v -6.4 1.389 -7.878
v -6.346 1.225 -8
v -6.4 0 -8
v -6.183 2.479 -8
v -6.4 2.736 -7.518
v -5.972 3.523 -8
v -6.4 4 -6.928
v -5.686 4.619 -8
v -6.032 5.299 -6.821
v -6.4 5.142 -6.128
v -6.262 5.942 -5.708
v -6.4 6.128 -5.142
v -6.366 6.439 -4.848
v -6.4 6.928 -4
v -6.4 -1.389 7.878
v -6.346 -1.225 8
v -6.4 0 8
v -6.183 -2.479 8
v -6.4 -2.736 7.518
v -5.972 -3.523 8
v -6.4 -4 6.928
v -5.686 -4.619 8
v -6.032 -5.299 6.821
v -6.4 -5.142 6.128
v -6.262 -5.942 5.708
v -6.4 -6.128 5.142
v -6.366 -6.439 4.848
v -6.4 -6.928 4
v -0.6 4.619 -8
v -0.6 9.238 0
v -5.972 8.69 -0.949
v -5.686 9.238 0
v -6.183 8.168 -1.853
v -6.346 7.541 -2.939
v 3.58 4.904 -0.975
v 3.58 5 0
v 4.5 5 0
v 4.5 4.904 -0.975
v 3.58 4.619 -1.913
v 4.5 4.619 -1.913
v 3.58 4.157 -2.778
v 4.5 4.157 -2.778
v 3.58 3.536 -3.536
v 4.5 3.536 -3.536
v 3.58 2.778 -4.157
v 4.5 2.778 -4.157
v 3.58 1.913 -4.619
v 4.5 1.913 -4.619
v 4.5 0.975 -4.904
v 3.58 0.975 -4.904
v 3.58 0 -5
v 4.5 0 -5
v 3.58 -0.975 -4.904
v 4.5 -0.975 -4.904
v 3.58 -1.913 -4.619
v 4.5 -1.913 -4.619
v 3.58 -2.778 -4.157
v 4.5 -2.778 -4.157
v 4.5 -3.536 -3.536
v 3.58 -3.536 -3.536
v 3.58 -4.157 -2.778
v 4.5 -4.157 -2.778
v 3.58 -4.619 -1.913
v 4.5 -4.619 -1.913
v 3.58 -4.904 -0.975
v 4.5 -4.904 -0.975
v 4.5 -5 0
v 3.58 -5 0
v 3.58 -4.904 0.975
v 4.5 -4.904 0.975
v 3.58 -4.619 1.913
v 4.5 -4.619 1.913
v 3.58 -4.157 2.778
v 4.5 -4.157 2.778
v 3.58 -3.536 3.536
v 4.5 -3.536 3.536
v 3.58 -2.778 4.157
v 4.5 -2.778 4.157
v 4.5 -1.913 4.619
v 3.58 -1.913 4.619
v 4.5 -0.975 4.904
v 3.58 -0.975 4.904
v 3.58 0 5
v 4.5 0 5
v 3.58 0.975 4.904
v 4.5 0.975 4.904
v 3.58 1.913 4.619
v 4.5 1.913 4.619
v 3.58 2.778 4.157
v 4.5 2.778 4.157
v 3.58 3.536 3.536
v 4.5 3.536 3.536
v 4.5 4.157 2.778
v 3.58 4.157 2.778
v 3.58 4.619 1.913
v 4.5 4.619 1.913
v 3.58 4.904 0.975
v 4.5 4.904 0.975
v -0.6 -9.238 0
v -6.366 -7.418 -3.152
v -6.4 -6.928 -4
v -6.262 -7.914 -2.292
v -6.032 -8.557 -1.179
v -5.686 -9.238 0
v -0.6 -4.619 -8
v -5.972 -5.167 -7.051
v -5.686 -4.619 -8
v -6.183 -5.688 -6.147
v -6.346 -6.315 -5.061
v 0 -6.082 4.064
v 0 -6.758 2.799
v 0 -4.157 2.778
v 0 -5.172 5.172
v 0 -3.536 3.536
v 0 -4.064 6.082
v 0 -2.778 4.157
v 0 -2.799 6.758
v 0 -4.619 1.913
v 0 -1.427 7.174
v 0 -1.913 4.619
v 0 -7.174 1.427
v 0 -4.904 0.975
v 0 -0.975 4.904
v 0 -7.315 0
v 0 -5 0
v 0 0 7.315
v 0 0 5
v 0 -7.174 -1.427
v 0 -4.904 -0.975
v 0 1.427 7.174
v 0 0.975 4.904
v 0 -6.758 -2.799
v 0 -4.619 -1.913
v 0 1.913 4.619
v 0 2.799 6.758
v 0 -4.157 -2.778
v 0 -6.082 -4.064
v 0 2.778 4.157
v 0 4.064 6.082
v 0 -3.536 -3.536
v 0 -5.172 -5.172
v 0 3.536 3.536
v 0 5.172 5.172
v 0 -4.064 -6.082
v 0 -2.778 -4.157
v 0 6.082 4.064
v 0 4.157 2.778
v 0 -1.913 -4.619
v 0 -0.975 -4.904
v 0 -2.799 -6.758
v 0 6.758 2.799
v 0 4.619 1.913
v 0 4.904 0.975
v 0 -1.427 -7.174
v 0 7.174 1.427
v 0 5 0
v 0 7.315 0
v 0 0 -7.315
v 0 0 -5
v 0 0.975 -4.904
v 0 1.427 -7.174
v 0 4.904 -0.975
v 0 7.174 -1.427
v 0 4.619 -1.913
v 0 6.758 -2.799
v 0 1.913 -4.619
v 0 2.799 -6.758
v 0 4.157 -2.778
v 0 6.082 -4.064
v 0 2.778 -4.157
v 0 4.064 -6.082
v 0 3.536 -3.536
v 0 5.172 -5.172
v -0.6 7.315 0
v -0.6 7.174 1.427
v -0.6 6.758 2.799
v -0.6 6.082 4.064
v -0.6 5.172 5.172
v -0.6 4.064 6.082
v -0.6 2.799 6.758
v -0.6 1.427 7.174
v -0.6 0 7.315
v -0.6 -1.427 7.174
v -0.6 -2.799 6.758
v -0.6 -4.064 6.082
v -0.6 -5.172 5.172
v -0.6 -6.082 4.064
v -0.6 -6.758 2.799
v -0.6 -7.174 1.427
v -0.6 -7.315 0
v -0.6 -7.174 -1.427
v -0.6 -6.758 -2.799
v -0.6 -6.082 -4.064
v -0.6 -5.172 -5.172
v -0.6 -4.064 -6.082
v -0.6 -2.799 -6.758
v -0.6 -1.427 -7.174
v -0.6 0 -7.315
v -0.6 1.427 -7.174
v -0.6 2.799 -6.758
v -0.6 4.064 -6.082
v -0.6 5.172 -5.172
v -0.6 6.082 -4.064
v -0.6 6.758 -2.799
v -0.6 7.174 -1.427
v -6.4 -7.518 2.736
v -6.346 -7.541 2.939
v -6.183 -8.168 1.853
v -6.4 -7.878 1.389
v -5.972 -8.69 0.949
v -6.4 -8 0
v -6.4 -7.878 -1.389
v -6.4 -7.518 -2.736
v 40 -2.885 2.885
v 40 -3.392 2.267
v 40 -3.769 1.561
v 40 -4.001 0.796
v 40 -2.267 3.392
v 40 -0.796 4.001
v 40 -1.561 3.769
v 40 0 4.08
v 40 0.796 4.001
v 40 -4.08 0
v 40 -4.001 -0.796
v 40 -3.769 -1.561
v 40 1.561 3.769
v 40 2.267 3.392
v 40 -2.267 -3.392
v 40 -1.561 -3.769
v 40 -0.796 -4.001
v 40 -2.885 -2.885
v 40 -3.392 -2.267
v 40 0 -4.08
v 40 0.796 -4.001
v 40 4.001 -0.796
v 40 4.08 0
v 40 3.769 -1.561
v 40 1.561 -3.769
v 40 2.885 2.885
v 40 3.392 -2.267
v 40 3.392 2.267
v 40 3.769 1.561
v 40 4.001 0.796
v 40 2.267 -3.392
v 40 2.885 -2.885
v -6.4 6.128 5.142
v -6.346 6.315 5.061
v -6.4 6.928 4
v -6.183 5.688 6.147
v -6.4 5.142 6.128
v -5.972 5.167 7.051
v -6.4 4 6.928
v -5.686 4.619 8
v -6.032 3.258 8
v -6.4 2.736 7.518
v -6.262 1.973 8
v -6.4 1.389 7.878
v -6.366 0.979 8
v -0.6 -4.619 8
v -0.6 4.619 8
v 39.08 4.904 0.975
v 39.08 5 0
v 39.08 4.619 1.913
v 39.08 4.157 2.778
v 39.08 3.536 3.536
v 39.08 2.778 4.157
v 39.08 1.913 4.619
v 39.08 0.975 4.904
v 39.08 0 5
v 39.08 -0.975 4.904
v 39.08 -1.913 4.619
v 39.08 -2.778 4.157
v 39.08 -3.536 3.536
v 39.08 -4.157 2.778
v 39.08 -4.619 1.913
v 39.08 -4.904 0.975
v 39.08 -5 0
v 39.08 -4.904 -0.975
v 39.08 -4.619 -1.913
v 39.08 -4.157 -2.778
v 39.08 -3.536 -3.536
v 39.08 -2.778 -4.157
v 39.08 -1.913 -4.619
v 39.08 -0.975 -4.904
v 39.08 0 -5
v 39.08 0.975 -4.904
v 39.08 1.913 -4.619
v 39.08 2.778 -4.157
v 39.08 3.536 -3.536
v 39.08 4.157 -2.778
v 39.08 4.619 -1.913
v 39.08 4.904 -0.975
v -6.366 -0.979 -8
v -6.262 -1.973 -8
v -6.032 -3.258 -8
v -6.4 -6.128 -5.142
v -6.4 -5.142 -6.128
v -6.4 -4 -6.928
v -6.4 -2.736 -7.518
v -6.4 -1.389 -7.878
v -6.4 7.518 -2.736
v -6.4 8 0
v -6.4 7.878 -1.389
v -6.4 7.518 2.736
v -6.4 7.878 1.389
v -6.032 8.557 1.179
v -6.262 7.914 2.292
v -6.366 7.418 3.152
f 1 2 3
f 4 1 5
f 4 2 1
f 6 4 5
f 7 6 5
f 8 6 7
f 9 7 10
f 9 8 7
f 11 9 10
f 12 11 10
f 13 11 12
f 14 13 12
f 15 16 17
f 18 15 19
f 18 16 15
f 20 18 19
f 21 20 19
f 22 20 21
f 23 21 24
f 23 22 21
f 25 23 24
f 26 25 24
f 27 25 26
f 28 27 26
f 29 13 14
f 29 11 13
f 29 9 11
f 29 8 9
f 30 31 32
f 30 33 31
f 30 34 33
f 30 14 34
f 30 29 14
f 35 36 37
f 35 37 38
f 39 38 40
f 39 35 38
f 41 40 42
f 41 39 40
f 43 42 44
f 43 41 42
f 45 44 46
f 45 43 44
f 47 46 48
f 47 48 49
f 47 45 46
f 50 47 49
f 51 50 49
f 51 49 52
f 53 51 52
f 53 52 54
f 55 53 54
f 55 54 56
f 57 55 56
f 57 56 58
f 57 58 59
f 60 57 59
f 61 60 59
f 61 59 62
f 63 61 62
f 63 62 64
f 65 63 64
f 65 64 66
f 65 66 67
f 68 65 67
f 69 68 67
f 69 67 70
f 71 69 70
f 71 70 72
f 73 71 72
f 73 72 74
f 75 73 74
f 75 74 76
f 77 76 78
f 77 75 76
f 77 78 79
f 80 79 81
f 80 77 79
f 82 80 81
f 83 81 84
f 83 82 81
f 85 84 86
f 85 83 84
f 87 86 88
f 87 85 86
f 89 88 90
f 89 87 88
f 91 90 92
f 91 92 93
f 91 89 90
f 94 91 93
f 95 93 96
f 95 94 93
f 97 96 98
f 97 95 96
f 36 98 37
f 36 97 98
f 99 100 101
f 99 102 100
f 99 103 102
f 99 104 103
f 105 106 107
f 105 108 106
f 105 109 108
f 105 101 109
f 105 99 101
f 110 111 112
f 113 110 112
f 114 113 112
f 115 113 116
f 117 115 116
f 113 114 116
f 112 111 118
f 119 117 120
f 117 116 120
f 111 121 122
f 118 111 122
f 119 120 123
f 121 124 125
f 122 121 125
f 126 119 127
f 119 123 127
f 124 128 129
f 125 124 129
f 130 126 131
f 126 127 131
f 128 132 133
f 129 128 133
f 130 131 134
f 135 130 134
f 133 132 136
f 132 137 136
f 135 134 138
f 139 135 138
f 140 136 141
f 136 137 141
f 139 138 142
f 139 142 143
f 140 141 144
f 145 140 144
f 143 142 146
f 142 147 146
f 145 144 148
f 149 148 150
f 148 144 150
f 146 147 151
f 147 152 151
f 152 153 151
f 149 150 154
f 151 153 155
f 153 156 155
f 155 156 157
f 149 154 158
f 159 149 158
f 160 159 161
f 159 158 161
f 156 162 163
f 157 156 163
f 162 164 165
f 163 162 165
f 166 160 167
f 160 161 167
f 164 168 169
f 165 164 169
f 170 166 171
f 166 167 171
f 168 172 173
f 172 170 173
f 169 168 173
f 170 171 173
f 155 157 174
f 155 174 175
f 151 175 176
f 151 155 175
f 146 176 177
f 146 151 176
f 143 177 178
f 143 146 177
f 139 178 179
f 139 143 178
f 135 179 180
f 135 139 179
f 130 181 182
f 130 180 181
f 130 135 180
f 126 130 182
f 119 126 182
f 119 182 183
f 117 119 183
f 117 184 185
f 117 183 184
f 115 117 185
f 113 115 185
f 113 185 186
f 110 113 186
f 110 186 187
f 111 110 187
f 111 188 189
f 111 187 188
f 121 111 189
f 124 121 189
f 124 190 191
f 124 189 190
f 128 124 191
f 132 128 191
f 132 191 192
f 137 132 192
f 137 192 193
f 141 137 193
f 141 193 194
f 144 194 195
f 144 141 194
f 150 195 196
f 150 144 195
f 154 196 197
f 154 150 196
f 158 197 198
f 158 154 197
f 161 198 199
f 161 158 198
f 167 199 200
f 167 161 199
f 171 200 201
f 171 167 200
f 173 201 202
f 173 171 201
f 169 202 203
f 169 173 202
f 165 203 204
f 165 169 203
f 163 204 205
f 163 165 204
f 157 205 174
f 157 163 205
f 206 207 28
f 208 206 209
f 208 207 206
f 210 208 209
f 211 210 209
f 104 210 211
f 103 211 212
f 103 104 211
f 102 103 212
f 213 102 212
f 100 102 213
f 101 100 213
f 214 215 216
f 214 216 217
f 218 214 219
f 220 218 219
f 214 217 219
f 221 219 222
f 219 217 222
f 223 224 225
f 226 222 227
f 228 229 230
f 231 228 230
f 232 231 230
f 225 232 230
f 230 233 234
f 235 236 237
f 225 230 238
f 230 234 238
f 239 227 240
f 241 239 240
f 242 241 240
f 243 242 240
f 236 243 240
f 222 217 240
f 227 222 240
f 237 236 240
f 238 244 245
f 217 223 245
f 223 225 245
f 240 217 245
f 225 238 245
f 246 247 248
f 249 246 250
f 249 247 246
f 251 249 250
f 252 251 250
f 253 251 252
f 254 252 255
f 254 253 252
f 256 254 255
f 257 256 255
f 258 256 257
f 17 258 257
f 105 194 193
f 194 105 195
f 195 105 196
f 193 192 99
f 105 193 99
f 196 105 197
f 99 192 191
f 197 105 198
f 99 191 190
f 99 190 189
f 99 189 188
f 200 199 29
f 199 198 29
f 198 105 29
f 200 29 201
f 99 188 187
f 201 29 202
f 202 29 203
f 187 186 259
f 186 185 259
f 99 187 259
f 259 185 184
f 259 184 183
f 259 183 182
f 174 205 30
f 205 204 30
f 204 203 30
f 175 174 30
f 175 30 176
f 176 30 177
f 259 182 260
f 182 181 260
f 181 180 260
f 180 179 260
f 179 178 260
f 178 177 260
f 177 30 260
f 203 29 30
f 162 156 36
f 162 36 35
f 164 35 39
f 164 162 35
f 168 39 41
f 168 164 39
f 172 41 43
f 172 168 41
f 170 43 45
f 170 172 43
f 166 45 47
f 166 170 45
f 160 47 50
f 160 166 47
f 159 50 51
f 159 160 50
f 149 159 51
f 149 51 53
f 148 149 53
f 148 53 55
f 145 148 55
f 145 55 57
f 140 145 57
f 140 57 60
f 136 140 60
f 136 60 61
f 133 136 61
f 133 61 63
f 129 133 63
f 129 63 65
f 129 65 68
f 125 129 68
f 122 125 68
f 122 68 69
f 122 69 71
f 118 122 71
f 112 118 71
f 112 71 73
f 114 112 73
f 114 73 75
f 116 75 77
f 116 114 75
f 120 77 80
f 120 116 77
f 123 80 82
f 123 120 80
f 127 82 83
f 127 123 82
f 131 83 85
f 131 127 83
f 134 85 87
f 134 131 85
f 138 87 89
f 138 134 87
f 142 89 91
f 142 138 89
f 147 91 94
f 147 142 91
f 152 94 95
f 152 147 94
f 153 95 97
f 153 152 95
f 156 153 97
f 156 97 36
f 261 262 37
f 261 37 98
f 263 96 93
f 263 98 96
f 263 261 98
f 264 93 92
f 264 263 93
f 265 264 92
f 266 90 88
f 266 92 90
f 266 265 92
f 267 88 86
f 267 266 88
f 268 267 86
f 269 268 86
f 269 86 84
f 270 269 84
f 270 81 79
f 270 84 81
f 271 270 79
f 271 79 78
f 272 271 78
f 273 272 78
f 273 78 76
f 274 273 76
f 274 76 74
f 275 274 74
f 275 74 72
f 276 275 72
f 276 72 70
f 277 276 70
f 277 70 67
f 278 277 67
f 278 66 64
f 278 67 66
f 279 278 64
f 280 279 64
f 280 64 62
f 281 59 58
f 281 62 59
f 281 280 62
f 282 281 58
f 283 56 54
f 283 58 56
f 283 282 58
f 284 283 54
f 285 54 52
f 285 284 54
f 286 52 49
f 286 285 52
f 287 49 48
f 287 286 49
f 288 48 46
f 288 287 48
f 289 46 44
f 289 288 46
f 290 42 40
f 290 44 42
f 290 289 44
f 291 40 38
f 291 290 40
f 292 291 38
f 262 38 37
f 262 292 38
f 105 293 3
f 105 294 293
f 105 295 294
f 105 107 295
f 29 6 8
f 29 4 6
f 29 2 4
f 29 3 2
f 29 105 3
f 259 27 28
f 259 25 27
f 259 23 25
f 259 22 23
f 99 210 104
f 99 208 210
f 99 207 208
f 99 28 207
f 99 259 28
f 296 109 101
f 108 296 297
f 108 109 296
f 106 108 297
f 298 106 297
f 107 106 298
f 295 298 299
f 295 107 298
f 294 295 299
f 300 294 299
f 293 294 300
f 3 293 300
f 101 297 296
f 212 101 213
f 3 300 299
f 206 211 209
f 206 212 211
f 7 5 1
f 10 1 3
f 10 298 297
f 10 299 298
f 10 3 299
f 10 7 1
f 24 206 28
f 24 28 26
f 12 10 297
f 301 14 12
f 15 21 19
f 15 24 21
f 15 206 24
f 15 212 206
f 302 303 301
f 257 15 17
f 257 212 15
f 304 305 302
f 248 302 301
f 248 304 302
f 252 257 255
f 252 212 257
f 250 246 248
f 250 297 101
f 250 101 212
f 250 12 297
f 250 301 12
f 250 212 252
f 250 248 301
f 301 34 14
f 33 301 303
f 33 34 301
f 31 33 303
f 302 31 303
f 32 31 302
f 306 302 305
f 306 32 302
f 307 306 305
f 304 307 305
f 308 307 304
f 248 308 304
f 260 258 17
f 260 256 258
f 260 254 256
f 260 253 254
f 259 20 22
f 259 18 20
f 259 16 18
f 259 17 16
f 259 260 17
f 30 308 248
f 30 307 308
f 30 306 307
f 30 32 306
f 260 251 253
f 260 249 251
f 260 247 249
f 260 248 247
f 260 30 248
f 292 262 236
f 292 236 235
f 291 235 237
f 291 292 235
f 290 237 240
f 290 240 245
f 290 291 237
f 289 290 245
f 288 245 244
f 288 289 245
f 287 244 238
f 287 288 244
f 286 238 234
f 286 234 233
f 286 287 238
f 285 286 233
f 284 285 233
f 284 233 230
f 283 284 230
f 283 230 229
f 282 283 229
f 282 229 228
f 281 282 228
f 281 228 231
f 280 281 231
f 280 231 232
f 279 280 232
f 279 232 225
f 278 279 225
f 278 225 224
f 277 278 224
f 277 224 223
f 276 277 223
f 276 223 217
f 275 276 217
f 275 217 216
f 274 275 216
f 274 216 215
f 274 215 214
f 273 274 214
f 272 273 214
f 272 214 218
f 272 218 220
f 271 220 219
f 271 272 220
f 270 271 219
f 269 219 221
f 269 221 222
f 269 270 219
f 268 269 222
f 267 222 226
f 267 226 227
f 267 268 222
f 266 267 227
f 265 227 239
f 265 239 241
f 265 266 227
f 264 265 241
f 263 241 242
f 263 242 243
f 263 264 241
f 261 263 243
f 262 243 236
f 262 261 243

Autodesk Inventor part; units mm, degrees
ref_plane "YZ Plane" through (0, 0, 0) normal (1, 0, 0) x (0, 1, 0)
ref_plane "XZ Plane" through (0, 0, 0) normal (0, 1, 0) x (-1, 0, 0)
sketch "Sketch1" plane through (0, 0, 0) normal (0, 0, 1) x (1, 0, 0)
  line L0 (0, 7.315) -> (0, 5)
  line L1 (4.5, 5) -> (40, 5)
  line L2 (40, 5) -> (40, 0)
  line L3 (40, 0) -> (-0.6001, 0)
  line L4 (-8.7201, 0) -> (48.12, 0) projected
  line L5 (-0.6001, 0) -> (-0.6001, 7.315)
  line L6 (-0.6001, 7.315) -> (0, 7.315)
  line L7 (4.5, 5) -> (3.5797, 5)
  line L8 (3.5797, 5) -> (0, 5)
  line L9 (0, -1.463) -> (0, 8.778) projected
  dimension "d0" = 40
  dimension "d1" = 35.5
  dimension "d2" = 10
  dimension "d9" = 0.6001
  dimension "d10" = 14.63
  dimension "d13" = 0.9203
  dimension "d14" = 10
revolve "Body" add sketch "Sketch1" angle 360 about axis through (40, 0, 0) along (-1, 0, 0)
sketch "Sketch2" plane through (-0.6001, 0, 0) normal (-1, 0, 0) x (0, 0, 1)
  line L0 (0, 9.2376) -> (8, 4.6188)
  line L1 (8, 4.6188) -> (8, -4.6188)
  line L2 (8, -4.6188) -> (0, -9.2376)
  line L3 (0, -9.2376) -> (-8, -4.6188)
  line L4 (-8, -4.6188) -> (-8, 4.6188)
  line L5 (-8, 4.6188) -> (0, 9.2376)
  point P0 (0, 0)
  point P1 (0, 0)
  dimension "d11" = 16
extrude "Head" add sketch "Sketch2" along normal blind 5.8
sketch "Sketch4" plane through (0, 0, 0) normal (0, 0, 1) x (1, 0, 0)
  line L0 (-6.4001, 8) -> (-6.4001, 9.2376)
  line L1 (-6.4001, 9.2376) -> (-5.6856, 9.2376)
  line L2 (-5.6856, 9.2376) -> (-6.4001, 8)
  line L3 (-7.5601, 0) -> (0.5599, 0) projected
  line L4 (-0.6001, 9.2376) -> (-6.4001, 9.2376) projected
  line L5 (-6.4001, 4.6188) -> (-6.4001, 9.2376) projected
  dimension "d5" = 30
  dimension "d19" = 16
revolve "Chamfer1" cut sketch "Sketch4" angle 360 about axis through (-10, 0, 0) along (1, 0, 0)
thread "Thread" size "M10x1.5" class "6g" standard "ISO Metric profile" length 35.5
chamfer "Chamfer2" distance 0.9202 distance2 0.9203 1 edges at (40, -5, 0) measured on face at (40, 1.2281, 0.495)
ref_plane "Work Plane1" through (1.525, 0, 0) normal (0, 0, 1) x (1, 0, 0)
equation "\"d11\" = SW"
equation "\"d3\" = KOH - SD"
equation "\"d15\" = GEL"
equation "\"d6\" = -0.5 * SPD + 0.5 * GD"
equation "\"d0\" = NLG"
equation "\"d1\" = GEL"
equation "\"d2\" = GD"
equation "\"d10\" = SD2"
equation "\"d14\" = BDM"
equation "\"d5\" = ANG1"
equation "\"d19\" = SW0"
equation "\"NLG\" = 40"
equation "\"GD\" = NND"
equation "\"BDM\" = NND"
equation "\"KOH\" = 6.4"
equation "\"GEL\" = 35.5"
equation "\"SW\" = 16"
equation "\"SW0\" = SW"
equation "\"SPD\" = NND - 1.2269 * PTC"
equation "\"SD2\" = 14.63"
equation "\"SD\" = 0.6"
equation "\"ANG1\" = 30deg"
equation "\"GAL\" = 0.61345 * PTC"
equation "\"GUL\" = 0.61345 * PTC"
equation "\"RR\" = 0.4"
equation "\"GD1\" = THREADDIA - 1.2269 * PTC"
equation "\"SDH\" = SD2"
equation "\"SDHG\" = 4.5"
equation "\"TOA\" = 30deg"
equation "\"PTC\" = 1.5"
equation "\"E0\" = 18.48"
equation "\"NND\" = 10"
equation "\"THREADDIA\" = 10"
properties part number "ISO 4017 - M10 x 40" material "Stainless Steel, 440C"
